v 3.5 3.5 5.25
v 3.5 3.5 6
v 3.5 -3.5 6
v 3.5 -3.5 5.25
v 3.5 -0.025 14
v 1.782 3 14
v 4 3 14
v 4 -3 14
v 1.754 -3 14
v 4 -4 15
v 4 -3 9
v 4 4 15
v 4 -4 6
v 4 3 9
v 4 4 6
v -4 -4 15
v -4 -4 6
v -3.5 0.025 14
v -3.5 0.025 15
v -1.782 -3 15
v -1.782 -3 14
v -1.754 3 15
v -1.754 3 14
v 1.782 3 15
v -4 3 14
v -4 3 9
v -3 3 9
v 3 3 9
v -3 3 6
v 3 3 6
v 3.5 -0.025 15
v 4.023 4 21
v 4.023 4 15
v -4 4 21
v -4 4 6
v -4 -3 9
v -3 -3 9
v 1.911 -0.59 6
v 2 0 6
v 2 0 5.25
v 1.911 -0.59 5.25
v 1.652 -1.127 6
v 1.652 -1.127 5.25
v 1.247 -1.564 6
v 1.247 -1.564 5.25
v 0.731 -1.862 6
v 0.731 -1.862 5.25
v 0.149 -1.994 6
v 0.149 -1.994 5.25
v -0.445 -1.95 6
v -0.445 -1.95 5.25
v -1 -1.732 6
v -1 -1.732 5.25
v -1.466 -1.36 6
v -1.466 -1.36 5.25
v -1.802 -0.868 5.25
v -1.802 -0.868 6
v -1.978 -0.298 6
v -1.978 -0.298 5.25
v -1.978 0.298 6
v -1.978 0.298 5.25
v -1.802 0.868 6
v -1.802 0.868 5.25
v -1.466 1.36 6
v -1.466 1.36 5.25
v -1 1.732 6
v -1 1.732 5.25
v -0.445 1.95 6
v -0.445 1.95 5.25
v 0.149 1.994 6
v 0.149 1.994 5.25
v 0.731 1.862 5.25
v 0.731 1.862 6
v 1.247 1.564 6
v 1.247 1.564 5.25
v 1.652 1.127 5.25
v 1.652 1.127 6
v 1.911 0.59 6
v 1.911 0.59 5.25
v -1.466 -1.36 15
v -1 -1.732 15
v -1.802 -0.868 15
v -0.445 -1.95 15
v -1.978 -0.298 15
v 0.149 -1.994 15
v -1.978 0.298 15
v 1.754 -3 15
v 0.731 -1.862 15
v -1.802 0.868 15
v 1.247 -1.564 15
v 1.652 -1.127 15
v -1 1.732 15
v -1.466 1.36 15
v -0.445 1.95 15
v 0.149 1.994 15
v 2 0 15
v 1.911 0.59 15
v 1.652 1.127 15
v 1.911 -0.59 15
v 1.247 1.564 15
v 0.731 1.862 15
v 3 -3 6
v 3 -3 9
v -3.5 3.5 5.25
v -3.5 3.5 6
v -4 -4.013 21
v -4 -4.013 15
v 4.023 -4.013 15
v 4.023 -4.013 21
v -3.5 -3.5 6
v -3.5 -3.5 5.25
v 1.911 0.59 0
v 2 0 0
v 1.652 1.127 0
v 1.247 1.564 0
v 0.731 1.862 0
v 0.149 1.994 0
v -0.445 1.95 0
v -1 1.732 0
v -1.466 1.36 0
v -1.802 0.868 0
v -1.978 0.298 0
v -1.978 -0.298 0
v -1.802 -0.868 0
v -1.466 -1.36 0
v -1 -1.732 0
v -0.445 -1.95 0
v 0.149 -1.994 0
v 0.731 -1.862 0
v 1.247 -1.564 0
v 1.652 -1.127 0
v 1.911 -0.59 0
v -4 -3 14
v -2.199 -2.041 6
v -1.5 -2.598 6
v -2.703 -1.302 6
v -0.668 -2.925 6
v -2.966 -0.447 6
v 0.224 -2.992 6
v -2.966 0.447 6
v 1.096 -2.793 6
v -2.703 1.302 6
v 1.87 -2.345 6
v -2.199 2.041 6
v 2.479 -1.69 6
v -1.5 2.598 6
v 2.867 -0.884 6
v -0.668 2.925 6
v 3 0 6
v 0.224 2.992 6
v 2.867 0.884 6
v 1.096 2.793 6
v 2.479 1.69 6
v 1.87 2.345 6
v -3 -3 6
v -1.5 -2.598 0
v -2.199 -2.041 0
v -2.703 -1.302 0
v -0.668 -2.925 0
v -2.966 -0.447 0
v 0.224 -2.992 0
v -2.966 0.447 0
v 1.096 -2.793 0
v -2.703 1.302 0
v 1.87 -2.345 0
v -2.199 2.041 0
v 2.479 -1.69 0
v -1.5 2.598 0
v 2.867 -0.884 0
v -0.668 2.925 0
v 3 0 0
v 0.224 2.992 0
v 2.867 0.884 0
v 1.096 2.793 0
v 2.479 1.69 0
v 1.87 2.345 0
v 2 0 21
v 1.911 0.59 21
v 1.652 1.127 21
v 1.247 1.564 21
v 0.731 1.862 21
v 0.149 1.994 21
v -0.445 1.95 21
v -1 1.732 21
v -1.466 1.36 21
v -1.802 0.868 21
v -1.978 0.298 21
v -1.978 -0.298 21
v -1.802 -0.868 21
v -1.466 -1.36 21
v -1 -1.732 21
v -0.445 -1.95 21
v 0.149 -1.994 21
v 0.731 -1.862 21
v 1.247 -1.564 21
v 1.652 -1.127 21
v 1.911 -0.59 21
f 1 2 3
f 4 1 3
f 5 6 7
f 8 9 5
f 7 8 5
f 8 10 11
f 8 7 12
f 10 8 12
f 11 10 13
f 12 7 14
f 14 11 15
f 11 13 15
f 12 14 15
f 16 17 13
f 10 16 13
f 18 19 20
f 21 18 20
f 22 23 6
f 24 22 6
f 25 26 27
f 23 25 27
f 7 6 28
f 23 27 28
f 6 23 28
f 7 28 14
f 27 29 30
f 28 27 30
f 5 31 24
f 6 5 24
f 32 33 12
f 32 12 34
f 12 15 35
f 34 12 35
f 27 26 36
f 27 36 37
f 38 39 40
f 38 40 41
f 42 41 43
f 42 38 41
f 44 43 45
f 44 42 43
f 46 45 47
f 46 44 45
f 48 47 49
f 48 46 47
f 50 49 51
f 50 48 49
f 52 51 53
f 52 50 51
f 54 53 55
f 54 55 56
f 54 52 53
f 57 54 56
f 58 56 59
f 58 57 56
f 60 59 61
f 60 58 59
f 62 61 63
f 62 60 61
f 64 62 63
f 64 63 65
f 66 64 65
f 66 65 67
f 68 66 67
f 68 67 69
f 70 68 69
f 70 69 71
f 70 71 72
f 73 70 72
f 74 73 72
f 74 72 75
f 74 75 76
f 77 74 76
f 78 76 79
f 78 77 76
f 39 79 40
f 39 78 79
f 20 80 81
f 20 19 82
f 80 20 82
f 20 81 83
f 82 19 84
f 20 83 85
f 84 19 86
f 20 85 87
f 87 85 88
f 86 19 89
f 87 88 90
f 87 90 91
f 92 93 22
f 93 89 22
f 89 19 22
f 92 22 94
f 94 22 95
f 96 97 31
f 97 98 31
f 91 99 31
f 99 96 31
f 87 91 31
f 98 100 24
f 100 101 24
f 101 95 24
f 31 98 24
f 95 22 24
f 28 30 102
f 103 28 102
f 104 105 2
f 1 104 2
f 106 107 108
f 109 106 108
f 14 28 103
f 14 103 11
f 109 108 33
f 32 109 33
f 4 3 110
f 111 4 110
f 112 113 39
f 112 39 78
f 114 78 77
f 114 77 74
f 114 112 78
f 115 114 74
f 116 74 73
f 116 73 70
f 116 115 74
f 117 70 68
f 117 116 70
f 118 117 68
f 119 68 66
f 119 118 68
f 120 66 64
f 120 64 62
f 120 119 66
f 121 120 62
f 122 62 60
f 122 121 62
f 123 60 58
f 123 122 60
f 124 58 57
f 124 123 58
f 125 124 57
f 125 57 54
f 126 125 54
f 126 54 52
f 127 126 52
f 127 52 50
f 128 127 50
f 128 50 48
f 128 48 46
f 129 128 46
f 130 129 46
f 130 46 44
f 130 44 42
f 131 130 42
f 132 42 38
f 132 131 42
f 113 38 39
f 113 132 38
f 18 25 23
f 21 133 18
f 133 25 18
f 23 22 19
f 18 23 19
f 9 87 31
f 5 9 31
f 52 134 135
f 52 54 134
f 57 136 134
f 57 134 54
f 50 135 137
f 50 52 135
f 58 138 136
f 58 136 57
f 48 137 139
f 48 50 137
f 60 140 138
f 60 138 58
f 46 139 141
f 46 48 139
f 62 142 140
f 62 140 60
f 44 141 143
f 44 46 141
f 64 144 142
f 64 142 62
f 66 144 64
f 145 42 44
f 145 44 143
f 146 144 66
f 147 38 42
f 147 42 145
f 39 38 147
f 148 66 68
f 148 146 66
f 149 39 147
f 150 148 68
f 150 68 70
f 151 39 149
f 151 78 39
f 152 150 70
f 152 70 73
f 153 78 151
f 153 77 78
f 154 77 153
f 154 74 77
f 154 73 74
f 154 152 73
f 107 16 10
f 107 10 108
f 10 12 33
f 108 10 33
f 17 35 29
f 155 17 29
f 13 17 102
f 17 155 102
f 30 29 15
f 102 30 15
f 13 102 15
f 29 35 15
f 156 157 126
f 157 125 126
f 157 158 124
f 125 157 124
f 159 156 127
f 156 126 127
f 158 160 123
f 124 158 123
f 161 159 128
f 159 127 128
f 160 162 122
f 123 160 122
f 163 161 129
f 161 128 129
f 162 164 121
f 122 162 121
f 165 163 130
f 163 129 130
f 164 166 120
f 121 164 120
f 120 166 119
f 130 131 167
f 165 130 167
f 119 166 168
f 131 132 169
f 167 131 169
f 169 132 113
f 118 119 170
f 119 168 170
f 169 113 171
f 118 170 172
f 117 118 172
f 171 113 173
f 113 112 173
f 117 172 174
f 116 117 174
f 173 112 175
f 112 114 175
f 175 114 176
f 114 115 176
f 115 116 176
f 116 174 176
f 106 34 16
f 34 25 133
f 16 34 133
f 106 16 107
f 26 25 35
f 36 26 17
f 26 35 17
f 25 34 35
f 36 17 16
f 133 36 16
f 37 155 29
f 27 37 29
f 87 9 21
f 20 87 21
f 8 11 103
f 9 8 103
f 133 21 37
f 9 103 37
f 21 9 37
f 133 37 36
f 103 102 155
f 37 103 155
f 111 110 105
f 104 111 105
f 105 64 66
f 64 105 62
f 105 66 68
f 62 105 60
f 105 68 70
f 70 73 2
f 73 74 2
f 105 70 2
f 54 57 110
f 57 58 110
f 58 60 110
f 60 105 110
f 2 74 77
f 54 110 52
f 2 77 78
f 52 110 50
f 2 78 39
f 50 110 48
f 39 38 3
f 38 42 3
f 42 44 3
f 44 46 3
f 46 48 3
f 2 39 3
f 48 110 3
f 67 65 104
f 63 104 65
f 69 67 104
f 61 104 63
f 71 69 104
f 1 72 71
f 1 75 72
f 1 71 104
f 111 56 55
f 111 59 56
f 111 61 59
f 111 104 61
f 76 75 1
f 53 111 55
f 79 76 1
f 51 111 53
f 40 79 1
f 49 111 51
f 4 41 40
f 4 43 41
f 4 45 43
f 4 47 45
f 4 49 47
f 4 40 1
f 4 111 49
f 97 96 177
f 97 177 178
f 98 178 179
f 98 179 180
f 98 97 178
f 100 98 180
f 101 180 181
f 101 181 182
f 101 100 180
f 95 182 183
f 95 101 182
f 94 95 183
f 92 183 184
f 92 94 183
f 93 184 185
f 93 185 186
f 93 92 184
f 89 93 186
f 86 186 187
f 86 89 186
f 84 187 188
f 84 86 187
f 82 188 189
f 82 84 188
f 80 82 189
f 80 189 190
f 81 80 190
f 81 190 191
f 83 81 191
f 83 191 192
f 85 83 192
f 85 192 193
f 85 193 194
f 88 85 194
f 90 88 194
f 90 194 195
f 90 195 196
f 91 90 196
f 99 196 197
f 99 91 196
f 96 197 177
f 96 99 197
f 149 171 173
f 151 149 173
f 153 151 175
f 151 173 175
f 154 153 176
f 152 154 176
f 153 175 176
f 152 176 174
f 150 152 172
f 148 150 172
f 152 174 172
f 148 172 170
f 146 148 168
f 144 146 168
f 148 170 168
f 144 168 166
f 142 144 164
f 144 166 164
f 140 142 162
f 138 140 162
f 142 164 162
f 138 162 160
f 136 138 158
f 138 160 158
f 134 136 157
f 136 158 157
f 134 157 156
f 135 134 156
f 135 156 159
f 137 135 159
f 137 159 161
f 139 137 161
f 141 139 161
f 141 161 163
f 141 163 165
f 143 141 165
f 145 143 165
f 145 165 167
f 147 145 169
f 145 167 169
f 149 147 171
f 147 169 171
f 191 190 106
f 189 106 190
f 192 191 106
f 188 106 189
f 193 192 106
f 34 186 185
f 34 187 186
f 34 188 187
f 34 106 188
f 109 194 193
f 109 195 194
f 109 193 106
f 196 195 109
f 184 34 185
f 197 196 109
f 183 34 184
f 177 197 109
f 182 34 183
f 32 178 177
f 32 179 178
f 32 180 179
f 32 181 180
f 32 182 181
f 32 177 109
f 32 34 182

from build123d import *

# Parameters (mm, degrees)
F0_R      = 3
F0_R_2    = 2
F1_DEPTH  = 6
F2_W      = 8
F2_H      = 8
F3_DEPTH  = 3
F4_W      = 6
F4_H      = 6
F4_R      = 2
F5_DEPTH  = 0.75
F6_W      = 1
F6_H      = 1
F7_DEPTH  = 6
F8_W      = 1
F8_H      = 1
F8_R      = 2
F9_DEPTH  = 6
F10_W     = 6
F10_H     = 1
F11_DEPTH = 7.62
F13_DEPTH = 1


with BuildPart() as f1:
    # F0 (on Top) → F1 (new body)
    with BuildSketch(Plane.XY):
        Circle(F0_R)
        Circle(F0_R_2, mode=Mode.SUBTRACT)
    extrude(amount=F1_DEPTH)


with BuildPart() as f3:
    # F2 (on face) → F3 (new body)
    with BuildSketch(Plane.XY.offset(6)):
        Rectangle(F2_W, F2_H)
        Polygon((0, 3), (3, 3), (3, 0), (3, -3), (0, -3), (-3, -3), (-3, 0), (-3, 3), align=None, mode=Mode.SUBTRACT)
    extrude(amount=F3_DEPTH)

    # F6 (on face) → F7 (join)
    with BuildSketch(Plane.XY.offset(9)):
        with Locations((-3.5, 3.5)):
            Rectangle(F6_W, F6_H)
        with Locations((3.5, 3.5)):
            Rectangle(F6_W, F6_H)
        with Locations((3.5, -3.5)):
            Rectangle(F6_W, F6_H)
        with Locations((-3.5, -3.5)):
            Rectangle(F6_W, F6_H)
    extrude(amount=F7_DEPTH)

    # F8 (on face) → F9 (join)
    with BuildSketch(Plane.XY.offset(15)):
        with Locations((-3.5, 3.5)):
            Rectangle(F8_W, F8_H)
        Polygon((4.02341, 4), (-3, 4), (-3, 3), (-4, 3), (-4, -4.013174), (4.02341, -4.013174), align=None)
        Circle(F8_R, mode=Mode.SUBTRACT)
    extrude(amount=F9_DEPTH)

    # F10 (on face) → F11 (join)
    with BuildSketch(Plane(origin=(0, 0, 15), x_dir=(1, 0, 0), z_dir=(0, 0, -1))):
        with Locations((0, 3.5)):
            Rectangle(F10_W, F10_H)
        with Locations((0, -3.5)):
            Rectangle(F10_W, F10_H)
    extrude(amount=F11_DEPTH)

    # F12 (on face) → F13 (join)
    with BuildSketch(Plane(origin=(0, 0, 15), x_dir=(1, 0, 0), z_dir=(0, 0, -1))):
        Polygon((-1.753777, -3), (-3.49991, -0.025116), (-1.782184, 3), (-4, 3), (-4, -3), align=None)
        Polygon((4, 3), (1.753777, 3), (3.49991, 0.025116), (1.782184, -3), (4, -3), align=None)
    extrude(amount=F13_DEPTH)


with BuildPart() as f5:
    # F4 (on face) → F5 (new body)
    with BuildSketch(Plane(origin=(0, 0, 6), x_dir=(1, 0, 0), z_dir=(0, 0, -1))):
        Polygon((3.5, 3.5), (-3.5, 3.5), (-3, 3), (3, 3), (3, -3), (3.5, -3.5), align=None)
        Rectangle(F4_W, F4_H)
        Circle(F4_R, mode=Mode.SUBTRACT)
        Polygon((-3, 3), (-3.5, 3.5), (-3.5, -3.5), (3.5, -3.5), (3, -3), (-3, -3), align=None)
    extrude(amount=F5_DEPTH)


solid = Compound([f1.part, f3.part, f5.part])
